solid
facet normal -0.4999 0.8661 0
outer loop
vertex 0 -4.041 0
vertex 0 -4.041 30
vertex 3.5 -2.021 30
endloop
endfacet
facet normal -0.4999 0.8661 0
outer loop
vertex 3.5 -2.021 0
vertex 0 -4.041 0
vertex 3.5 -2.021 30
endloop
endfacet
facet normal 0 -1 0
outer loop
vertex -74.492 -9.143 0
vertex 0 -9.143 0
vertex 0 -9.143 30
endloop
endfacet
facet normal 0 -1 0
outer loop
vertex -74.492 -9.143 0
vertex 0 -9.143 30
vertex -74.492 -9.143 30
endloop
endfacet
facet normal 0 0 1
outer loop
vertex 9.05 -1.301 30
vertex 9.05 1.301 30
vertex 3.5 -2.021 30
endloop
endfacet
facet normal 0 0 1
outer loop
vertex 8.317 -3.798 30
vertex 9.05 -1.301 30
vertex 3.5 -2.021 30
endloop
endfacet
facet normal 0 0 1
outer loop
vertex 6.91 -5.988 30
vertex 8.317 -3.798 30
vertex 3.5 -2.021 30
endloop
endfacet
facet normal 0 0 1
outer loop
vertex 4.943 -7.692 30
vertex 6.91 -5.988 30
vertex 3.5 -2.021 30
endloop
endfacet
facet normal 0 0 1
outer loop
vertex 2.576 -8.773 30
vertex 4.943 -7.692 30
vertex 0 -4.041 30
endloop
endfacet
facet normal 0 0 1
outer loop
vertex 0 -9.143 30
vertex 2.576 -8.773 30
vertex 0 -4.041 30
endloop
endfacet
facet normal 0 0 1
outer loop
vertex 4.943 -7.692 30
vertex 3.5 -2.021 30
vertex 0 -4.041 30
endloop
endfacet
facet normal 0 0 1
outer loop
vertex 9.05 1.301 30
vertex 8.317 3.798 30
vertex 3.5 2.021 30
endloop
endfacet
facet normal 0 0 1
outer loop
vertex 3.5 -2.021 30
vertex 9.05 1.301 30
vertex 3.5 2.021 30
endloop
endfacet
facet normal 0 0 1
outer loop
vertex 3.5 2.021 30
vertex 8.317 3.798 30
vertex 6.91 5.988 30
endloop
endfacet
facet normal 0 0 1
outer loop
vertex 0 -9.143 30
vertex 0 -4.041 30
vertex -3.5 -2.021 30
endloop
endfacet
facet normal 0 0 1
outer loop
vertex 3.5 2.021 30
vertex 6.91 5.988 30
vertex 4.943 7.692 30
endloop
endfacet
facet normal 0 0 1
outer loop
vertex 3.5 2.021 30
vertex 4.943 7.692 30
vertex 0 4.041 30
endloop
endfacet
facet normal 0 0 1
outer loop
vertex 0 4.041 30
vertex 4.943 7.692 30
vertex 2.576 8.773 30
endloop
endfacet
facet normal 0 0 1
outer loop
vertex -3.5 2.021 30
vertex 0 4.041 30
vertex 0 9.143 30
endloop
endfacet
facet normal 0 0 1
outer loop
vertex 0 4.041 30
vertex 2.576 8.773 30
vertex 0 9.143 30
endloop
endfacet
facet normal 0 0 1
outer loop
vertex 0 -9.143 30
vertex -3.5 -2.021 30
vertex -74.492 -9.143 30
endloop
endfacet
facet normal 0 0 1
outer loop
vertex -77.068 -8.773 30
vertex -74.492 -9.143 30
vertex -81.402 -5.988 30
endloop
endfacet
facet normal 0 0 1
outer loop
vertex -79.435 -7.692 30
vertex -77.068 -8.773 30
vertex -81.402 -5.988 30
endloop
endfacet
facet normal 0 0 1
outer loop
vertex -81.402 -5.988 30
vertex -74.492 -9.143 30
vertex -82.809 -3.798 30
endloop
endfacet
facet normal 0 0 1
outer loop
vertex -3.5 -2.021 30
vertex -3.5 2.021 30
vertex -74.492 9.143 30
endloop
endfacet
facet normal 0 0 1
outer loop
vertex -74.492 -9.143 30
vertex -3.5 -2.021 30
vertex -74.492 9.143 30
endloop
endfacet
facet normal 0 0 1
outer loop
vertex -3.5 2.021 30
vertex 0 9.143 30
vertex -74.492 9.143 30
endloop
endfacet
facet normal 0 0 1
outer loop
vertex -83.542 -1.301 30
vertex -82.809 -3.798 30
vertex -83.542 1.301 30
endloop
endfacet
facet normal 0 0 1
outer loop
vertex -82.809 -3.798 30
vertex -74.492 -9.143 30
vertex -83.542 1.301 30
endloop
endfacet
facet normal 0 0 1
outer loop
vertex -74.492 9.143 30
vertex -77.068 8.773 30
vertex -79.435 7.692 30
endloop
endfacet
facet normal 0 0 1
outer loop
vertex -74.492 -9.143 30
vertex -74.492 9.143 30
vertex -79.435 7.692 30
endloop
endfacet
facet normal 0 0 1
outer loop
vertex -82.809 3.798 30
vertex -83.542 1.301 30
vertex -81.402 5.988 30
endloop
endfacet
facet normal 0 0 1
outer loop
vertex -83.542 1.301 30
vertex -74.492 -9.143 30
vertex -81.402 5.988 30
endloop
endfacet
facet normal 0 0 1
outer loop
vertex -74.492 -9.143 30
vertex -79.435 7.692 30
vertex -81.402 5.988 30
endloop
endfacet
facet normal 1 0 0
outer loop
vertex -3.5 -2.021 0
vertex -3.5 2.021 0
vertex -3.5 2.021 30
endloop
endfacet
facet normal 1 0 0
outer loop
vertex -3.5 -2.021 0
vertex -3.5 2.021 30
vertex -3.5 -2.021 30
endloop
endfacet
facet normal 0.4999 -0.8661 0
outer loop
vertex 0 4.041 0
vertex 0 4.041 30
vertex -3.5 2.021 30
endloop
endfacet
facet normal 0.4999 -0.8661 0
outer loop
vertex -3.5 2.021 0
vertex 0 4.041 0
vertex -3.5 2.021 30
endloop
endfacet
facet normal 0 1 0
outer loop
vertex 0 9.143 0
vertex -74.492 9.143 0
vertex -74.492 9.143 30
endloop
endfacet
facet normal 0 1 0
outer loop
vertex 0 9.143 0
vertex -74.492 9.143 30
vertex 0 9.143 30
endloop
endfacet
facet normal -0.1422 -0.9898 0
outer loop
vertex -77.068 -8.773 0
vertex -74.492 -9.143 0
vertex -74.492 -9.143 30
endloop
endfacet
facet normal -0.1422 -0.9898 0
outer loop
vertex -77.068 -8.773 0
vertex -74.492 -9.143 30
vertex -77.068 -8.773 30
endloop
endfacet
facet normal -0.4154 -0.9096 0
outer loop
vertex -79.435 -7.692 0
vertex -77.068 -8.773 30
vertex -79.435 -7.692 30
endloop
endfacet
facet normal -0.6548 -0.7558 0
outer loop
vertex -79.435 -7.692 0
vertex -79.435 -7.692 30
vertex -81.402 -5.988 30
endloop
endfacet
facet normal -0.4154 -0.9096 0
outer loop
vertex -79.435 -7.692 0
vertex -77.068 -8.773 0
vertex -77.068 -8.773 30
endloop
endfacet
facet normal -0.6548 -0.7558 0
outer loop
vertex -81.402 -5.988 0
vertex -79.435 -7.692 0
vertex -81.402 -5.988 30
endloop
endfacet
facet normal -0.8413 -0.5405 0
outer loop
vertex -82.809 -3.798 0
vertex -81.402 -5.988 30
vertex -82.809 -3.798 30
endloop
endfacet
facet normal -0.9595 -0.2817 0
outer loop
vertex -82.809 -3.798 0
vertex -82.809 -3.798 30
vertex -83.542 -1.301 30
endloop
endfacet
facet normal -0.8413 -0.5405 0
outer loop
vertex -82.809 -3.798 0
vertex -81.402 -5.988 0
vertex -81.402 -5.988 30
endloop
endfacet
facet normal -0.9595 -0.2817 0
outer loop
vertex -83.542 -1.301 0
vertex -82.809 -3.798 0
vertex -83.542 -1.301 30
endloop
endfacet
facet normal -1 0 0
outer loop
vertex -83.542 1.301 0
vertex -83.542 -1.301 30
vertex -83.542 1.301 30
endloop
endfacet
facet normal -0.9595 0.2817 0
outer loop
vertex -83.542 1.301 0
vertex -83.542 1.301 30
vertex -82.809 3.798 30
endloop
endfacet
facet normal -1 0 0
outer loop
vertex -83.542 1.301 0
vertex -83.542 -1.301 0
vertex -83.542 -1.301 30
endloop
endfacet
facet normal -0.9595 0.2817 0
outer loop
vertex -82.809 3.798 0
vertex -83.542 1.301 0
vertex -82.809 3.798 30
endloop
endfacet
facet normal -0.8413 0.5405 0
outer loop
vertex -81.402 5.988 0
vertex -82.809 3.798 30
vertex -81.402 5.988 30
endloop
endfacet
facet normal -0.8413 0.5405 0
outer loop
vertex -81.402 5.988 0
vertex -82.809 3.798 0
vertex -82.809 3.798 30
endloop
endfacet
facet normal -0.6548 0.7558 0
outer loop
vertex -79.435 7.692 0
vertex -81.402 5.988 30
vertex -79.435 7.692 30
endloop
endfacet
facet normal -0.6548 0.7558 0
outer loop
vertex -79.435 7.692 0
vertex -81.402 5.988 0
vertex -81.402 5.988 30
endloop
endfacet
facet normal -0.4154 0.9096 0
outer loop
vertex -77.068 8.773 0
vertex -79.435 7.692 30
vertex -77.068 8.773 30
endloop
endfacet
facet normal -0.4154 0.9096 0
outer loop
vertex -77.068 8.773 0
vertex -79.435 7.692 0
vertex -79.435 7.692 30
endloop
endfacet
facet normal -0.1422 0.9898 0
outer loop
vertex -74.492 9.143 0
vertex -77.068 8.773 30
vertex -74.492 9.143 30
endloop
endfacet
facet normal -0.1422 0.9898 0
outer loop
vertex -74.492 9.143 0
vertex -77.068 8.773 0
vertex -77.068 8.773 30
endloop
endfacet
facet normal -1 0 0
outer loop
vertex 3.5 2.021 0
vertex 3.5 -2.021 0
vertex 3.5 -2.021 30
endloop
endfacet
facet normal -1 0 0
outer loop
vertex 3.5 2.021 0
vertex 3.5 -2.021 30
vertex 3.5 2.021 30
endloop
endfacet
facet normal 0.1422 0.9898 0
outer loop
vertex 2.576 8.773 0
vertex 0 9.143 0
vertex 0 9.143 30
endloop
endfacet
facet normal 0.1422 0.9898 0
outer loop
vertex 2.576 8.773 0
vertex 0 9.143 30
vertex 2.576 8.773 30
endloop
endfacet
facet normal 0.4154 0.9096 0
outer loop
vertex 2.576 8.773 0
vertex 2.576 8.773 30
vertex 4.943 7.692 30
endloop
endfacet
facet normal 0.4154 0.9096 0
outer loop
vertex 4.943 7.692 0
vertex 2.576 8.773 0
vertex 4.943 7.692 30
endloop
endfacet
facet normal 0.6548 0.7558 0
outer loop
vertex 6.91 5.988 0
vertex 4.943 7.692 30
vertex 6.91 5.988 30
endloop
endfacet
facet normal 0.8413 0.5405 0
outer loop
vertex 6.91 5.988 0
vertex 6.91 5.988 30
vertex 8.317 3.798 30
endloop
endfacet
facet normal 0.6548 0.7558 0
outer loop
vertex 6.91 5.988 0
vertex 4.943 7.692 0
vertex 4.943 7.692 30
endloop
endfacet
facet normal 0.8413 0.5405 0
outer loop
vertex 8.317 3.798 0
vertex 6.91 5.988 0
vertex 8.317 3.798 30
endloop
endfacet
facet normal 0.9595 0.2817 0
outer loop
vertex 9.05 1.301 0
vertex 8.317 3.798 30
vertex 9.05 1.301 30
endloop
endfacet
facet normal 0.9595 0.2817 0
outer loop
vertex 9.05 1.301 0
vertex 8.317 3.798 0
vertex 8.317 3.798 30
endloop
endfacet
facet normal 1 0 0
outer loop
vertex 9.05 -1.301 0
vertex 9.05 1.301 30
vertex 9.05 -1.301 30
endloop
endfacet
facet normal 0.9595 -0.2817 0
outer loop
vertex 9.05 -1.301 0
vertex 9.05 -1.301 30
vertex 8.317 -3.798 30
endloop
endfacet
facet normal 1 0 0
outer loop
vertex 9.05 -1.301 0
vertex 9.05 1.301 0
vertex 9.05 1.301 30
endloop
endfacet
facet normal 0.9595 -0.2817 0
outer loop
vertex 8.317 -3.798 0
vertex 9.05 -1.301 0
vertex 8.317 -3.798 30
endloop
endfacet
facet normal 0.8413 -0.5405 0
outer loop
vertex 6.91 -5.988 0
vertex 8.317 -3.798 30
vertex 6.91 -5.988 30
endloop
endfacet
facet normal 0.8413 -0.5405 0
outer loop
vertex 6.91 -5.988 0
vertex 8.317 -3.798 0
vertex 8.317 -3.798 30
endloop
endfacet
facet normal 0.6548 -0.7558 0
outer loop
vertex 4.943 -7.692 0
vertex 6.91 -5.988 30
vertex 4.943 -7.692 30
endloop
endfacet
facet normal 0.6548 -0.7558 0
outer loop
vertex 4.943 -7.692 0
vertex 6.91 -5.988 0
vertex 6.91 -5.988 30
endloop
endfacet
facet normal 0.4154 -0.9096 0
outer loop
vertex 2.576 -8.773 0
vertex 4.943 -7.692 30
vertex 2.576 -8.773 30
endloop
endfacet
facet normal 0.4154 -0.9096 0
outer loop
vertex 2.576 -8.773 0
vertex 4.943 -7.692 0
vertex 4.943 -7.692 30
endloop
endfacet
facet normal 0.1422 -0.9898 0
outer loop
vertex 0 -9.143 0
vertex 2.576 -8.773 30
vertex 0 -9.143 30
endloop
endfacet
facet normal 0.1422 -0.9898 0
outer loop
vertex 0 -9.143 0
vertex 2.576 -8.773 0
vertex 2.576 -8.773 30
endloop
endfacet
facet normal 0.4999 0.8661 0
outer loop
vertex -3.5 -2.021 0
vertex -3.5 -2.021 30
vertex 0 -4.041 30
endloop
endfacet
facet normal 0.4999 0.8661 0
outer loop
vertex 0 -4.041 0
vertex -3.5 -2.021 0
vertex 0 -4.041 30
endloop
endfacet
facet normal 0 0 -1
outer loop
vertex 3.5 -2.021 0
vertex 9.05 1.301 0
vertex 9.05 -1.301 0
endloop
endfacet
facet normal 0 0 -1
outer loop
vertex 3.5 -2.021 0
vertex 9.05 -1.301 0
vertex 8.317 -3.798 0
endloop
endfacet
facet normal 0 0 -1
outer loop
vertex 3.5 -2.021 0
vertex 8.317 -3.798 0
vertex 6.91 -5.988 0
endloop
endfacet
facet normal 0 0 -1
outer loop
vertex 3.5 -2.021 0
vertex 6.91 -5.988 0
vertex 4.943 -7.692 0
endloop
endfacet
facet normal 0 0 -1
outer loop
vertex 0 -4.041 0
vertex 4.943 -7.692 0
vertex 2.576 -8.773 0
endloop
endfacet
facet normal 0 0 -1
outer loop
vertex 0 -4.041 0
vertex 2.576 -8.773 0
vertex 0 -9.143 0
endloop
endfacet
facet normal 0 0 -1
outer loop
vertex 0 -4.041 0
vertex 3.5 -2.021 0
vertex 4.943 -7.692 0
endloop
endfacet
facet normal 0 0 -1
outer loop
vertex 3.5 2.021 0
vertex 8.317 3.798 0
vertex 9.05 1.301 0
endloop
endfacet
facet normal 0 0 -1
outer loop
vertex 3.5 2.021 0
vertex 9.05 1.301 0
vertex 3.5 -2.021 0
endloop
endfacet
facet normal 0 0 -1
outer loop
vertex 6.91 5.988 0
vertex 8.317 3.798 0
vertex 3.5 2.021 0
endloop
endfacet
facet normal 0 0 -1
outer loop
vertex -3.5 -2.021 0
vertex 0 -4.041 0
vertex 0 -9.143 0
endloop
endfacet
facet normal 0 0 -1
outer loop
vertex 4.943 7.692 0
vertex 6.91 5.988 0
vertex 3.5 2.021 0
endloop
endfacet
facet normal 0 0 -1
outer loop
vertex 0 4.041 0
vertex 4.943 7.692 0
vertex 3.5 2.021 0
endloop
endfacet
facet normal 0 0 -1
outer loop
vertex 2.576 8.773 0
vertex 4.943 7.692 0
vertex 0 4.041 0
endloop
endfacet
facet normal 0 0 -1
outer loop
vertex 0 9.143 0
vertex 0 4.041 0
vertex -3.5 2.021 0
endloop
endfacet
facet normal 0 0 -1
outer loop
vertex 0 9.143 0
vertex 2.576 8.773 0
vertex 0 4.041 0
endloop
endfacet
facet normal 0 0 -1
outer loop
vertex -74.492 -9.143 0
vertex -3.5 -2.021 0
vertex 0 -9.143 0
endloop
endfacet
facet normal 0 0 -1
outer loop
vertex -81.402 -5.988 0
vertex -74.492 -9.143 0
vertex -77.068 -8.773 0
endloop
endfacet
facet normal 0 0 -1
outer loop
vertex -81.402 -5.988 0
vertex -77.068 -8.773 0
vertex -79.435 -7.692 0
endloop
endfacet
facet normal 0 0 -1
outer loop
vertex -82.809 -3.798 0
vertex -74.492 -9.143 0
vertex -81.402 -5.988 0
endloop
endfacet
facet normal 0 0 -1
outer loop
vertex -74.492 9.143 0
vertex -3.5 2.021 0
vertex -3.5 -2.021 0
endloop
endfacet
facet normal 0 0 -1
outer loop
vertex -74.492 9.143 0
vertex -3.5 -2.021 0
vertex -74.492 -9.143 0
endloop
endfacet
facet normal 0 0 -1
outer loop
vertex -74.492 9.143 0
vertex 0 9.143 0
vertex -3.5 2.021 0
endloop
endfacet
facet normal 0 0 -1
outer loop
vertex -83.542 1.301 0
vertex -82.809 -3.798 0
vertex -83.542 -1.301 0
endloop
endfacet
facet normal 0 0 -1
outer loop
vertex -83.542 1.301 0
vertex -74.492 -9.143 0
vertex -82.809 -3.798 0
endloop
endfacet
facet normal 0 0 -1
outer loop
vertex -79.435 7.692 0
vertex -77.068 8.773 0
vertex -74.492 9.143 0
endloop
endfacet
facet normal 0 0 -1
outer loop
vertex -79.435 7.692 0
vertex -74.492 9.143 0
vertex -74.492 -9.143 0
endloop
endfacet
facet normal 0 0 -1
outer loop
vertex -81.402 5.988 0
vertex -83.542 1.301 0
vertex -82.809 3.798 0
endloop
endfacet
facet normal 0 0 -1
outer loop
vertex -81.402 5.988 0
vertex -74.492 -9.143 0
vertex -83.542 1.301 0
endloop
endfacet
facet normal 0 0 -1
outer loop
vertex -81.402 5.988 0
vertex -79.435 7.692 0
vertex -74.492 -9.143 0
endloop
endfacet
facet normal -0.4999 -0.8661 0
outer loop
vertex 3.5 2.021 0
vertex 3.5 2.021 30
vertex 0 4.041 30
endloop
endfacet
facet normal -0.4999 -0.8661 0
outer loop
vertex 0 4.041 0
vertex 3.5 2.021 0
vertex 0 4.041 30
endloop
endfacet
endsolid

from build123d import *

# Parameters (mm, degrees)
BOSS_EXTRUDE1_DEPTH = 30
CUT_EXTRUDE1_DEPTH  = 90.32223687


with BuildPart() as part:
    # Sketch1 → Boss-Extrude1 (new body)
    with BuildSketch(Plane.XY):
        with BuildLine():
            Line((0, -9.14322974), (-74.492069921, -9.14322974))
            ThreePointArc((-74.492069921, -9.14322974), (-83.635299661, 0), (-74.492069921, 9.14322974))
            Line((-74.492069921, 9.14322974), (0, 9.14322974))
            ThreePointArc((0, 9.14322974), (9.14322974, 0), (0, -9.14322974))
        make_face()
    extrude(amount=BOSS_EXTRUDE1_DEPTH)

    # Sketch2 → Cut-Extrude1 (cut, through all)
    with BuildSketch(Plane.XY.offset(30)):
        Polygon((-3.5, 2.020725942), (-3.5, -2.020725942), (0, -4.041451884), (3.5, -2.020725942), (3.5, 2.020725942), (0, 4.041451884), align=None)
    extrude(amount=-CUT_EXTRUDE1_DEPTH, mode=Mode.SUBTRACT)


solid = part.part
